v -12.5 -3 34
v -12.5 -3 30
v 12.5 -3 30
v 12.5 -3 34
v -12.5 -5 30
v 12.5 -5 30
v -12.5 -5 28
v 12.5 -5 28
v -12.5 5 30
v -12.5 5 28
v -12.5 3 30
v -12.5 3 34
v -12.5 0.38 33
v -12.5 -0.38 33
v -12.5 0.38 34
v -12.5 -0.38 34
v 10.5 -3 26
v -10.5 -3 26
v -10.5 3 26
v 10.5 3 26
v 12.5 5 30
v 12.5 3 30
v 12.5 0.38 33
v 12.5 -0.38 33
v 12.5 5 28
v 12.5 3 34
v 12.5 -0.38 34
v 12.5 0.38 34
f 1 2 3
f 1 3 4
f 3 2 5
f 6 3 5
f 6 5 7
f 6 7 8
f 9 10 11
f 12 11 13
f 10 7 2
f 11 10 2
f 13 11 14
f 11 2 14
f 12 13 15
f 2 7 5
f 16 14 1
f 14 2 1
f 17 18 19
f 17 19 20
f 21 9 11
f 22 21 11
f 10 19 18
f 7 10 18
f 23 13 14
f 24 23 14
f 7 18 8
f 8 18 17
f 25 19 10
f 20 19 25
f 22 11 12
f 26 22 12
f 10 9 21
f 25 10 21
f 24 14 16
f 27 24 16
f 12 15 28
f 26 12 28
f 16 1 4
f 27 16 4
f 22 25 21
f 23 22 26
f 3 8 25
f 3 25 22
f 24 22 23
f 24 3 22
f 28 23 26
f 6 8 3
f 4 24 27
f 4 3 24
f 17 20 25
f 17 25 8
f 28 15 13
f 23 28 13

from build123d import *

# Parameters (mm, degrees)
F0_W     = 25
F0_H     = 8
F1_DEPTH = 5
F2_SIZE  = 2
F3_SIZE  = 2
F4_W     = 2
F4_H     = 4
F5_DEPTH = 25


with BuildPart() as f1:
    # F0 (on Front) → F1 (new body, symmetric)
    with BuildSketch(Plane.XZ):
        with Locations((0, 30)):
            Rectangle(F0_W, F0_H)
    extrude(amount=F1_DEPTH, both=True)

    # F2
    f2_edges = [f1.edges().sort_by_distance(p)[0] for p in [
        (12.5, 0, 26),
        (-12.5, 0, 26),
    ]]
    chamfer(f2_edges, length=F2_SIZE)

    # F3
    f3_edges = [f1.edges().sort_by_distance(p)[0] for p in [
        (0, -5, 26),
        (0, 5, 26),
    ]]
    chamfer(f3_edges, length=F3_SIZE)

    # F4 (on face) → F5 (cut)
    with BuildSketch(Plane(origin=(-12.5, 0, 0), x_dir=(0, -1, 0), z_dir=(-1, 0, 0))):
        with Locations((4, 32)):
            Rectangle(F4_W, F4_H)
        with Locations((-4, 32)):
            Rectangle(F4_W, F4_H)
        Polygon((-0.38, 33), (0, 33), (0.38, 33), (0.38, 34), (-0.38, 34), align=None)
    extrude(amount=-F5_DEPTH, mode=Mode.SUBTRACT)


solid = f1.part
